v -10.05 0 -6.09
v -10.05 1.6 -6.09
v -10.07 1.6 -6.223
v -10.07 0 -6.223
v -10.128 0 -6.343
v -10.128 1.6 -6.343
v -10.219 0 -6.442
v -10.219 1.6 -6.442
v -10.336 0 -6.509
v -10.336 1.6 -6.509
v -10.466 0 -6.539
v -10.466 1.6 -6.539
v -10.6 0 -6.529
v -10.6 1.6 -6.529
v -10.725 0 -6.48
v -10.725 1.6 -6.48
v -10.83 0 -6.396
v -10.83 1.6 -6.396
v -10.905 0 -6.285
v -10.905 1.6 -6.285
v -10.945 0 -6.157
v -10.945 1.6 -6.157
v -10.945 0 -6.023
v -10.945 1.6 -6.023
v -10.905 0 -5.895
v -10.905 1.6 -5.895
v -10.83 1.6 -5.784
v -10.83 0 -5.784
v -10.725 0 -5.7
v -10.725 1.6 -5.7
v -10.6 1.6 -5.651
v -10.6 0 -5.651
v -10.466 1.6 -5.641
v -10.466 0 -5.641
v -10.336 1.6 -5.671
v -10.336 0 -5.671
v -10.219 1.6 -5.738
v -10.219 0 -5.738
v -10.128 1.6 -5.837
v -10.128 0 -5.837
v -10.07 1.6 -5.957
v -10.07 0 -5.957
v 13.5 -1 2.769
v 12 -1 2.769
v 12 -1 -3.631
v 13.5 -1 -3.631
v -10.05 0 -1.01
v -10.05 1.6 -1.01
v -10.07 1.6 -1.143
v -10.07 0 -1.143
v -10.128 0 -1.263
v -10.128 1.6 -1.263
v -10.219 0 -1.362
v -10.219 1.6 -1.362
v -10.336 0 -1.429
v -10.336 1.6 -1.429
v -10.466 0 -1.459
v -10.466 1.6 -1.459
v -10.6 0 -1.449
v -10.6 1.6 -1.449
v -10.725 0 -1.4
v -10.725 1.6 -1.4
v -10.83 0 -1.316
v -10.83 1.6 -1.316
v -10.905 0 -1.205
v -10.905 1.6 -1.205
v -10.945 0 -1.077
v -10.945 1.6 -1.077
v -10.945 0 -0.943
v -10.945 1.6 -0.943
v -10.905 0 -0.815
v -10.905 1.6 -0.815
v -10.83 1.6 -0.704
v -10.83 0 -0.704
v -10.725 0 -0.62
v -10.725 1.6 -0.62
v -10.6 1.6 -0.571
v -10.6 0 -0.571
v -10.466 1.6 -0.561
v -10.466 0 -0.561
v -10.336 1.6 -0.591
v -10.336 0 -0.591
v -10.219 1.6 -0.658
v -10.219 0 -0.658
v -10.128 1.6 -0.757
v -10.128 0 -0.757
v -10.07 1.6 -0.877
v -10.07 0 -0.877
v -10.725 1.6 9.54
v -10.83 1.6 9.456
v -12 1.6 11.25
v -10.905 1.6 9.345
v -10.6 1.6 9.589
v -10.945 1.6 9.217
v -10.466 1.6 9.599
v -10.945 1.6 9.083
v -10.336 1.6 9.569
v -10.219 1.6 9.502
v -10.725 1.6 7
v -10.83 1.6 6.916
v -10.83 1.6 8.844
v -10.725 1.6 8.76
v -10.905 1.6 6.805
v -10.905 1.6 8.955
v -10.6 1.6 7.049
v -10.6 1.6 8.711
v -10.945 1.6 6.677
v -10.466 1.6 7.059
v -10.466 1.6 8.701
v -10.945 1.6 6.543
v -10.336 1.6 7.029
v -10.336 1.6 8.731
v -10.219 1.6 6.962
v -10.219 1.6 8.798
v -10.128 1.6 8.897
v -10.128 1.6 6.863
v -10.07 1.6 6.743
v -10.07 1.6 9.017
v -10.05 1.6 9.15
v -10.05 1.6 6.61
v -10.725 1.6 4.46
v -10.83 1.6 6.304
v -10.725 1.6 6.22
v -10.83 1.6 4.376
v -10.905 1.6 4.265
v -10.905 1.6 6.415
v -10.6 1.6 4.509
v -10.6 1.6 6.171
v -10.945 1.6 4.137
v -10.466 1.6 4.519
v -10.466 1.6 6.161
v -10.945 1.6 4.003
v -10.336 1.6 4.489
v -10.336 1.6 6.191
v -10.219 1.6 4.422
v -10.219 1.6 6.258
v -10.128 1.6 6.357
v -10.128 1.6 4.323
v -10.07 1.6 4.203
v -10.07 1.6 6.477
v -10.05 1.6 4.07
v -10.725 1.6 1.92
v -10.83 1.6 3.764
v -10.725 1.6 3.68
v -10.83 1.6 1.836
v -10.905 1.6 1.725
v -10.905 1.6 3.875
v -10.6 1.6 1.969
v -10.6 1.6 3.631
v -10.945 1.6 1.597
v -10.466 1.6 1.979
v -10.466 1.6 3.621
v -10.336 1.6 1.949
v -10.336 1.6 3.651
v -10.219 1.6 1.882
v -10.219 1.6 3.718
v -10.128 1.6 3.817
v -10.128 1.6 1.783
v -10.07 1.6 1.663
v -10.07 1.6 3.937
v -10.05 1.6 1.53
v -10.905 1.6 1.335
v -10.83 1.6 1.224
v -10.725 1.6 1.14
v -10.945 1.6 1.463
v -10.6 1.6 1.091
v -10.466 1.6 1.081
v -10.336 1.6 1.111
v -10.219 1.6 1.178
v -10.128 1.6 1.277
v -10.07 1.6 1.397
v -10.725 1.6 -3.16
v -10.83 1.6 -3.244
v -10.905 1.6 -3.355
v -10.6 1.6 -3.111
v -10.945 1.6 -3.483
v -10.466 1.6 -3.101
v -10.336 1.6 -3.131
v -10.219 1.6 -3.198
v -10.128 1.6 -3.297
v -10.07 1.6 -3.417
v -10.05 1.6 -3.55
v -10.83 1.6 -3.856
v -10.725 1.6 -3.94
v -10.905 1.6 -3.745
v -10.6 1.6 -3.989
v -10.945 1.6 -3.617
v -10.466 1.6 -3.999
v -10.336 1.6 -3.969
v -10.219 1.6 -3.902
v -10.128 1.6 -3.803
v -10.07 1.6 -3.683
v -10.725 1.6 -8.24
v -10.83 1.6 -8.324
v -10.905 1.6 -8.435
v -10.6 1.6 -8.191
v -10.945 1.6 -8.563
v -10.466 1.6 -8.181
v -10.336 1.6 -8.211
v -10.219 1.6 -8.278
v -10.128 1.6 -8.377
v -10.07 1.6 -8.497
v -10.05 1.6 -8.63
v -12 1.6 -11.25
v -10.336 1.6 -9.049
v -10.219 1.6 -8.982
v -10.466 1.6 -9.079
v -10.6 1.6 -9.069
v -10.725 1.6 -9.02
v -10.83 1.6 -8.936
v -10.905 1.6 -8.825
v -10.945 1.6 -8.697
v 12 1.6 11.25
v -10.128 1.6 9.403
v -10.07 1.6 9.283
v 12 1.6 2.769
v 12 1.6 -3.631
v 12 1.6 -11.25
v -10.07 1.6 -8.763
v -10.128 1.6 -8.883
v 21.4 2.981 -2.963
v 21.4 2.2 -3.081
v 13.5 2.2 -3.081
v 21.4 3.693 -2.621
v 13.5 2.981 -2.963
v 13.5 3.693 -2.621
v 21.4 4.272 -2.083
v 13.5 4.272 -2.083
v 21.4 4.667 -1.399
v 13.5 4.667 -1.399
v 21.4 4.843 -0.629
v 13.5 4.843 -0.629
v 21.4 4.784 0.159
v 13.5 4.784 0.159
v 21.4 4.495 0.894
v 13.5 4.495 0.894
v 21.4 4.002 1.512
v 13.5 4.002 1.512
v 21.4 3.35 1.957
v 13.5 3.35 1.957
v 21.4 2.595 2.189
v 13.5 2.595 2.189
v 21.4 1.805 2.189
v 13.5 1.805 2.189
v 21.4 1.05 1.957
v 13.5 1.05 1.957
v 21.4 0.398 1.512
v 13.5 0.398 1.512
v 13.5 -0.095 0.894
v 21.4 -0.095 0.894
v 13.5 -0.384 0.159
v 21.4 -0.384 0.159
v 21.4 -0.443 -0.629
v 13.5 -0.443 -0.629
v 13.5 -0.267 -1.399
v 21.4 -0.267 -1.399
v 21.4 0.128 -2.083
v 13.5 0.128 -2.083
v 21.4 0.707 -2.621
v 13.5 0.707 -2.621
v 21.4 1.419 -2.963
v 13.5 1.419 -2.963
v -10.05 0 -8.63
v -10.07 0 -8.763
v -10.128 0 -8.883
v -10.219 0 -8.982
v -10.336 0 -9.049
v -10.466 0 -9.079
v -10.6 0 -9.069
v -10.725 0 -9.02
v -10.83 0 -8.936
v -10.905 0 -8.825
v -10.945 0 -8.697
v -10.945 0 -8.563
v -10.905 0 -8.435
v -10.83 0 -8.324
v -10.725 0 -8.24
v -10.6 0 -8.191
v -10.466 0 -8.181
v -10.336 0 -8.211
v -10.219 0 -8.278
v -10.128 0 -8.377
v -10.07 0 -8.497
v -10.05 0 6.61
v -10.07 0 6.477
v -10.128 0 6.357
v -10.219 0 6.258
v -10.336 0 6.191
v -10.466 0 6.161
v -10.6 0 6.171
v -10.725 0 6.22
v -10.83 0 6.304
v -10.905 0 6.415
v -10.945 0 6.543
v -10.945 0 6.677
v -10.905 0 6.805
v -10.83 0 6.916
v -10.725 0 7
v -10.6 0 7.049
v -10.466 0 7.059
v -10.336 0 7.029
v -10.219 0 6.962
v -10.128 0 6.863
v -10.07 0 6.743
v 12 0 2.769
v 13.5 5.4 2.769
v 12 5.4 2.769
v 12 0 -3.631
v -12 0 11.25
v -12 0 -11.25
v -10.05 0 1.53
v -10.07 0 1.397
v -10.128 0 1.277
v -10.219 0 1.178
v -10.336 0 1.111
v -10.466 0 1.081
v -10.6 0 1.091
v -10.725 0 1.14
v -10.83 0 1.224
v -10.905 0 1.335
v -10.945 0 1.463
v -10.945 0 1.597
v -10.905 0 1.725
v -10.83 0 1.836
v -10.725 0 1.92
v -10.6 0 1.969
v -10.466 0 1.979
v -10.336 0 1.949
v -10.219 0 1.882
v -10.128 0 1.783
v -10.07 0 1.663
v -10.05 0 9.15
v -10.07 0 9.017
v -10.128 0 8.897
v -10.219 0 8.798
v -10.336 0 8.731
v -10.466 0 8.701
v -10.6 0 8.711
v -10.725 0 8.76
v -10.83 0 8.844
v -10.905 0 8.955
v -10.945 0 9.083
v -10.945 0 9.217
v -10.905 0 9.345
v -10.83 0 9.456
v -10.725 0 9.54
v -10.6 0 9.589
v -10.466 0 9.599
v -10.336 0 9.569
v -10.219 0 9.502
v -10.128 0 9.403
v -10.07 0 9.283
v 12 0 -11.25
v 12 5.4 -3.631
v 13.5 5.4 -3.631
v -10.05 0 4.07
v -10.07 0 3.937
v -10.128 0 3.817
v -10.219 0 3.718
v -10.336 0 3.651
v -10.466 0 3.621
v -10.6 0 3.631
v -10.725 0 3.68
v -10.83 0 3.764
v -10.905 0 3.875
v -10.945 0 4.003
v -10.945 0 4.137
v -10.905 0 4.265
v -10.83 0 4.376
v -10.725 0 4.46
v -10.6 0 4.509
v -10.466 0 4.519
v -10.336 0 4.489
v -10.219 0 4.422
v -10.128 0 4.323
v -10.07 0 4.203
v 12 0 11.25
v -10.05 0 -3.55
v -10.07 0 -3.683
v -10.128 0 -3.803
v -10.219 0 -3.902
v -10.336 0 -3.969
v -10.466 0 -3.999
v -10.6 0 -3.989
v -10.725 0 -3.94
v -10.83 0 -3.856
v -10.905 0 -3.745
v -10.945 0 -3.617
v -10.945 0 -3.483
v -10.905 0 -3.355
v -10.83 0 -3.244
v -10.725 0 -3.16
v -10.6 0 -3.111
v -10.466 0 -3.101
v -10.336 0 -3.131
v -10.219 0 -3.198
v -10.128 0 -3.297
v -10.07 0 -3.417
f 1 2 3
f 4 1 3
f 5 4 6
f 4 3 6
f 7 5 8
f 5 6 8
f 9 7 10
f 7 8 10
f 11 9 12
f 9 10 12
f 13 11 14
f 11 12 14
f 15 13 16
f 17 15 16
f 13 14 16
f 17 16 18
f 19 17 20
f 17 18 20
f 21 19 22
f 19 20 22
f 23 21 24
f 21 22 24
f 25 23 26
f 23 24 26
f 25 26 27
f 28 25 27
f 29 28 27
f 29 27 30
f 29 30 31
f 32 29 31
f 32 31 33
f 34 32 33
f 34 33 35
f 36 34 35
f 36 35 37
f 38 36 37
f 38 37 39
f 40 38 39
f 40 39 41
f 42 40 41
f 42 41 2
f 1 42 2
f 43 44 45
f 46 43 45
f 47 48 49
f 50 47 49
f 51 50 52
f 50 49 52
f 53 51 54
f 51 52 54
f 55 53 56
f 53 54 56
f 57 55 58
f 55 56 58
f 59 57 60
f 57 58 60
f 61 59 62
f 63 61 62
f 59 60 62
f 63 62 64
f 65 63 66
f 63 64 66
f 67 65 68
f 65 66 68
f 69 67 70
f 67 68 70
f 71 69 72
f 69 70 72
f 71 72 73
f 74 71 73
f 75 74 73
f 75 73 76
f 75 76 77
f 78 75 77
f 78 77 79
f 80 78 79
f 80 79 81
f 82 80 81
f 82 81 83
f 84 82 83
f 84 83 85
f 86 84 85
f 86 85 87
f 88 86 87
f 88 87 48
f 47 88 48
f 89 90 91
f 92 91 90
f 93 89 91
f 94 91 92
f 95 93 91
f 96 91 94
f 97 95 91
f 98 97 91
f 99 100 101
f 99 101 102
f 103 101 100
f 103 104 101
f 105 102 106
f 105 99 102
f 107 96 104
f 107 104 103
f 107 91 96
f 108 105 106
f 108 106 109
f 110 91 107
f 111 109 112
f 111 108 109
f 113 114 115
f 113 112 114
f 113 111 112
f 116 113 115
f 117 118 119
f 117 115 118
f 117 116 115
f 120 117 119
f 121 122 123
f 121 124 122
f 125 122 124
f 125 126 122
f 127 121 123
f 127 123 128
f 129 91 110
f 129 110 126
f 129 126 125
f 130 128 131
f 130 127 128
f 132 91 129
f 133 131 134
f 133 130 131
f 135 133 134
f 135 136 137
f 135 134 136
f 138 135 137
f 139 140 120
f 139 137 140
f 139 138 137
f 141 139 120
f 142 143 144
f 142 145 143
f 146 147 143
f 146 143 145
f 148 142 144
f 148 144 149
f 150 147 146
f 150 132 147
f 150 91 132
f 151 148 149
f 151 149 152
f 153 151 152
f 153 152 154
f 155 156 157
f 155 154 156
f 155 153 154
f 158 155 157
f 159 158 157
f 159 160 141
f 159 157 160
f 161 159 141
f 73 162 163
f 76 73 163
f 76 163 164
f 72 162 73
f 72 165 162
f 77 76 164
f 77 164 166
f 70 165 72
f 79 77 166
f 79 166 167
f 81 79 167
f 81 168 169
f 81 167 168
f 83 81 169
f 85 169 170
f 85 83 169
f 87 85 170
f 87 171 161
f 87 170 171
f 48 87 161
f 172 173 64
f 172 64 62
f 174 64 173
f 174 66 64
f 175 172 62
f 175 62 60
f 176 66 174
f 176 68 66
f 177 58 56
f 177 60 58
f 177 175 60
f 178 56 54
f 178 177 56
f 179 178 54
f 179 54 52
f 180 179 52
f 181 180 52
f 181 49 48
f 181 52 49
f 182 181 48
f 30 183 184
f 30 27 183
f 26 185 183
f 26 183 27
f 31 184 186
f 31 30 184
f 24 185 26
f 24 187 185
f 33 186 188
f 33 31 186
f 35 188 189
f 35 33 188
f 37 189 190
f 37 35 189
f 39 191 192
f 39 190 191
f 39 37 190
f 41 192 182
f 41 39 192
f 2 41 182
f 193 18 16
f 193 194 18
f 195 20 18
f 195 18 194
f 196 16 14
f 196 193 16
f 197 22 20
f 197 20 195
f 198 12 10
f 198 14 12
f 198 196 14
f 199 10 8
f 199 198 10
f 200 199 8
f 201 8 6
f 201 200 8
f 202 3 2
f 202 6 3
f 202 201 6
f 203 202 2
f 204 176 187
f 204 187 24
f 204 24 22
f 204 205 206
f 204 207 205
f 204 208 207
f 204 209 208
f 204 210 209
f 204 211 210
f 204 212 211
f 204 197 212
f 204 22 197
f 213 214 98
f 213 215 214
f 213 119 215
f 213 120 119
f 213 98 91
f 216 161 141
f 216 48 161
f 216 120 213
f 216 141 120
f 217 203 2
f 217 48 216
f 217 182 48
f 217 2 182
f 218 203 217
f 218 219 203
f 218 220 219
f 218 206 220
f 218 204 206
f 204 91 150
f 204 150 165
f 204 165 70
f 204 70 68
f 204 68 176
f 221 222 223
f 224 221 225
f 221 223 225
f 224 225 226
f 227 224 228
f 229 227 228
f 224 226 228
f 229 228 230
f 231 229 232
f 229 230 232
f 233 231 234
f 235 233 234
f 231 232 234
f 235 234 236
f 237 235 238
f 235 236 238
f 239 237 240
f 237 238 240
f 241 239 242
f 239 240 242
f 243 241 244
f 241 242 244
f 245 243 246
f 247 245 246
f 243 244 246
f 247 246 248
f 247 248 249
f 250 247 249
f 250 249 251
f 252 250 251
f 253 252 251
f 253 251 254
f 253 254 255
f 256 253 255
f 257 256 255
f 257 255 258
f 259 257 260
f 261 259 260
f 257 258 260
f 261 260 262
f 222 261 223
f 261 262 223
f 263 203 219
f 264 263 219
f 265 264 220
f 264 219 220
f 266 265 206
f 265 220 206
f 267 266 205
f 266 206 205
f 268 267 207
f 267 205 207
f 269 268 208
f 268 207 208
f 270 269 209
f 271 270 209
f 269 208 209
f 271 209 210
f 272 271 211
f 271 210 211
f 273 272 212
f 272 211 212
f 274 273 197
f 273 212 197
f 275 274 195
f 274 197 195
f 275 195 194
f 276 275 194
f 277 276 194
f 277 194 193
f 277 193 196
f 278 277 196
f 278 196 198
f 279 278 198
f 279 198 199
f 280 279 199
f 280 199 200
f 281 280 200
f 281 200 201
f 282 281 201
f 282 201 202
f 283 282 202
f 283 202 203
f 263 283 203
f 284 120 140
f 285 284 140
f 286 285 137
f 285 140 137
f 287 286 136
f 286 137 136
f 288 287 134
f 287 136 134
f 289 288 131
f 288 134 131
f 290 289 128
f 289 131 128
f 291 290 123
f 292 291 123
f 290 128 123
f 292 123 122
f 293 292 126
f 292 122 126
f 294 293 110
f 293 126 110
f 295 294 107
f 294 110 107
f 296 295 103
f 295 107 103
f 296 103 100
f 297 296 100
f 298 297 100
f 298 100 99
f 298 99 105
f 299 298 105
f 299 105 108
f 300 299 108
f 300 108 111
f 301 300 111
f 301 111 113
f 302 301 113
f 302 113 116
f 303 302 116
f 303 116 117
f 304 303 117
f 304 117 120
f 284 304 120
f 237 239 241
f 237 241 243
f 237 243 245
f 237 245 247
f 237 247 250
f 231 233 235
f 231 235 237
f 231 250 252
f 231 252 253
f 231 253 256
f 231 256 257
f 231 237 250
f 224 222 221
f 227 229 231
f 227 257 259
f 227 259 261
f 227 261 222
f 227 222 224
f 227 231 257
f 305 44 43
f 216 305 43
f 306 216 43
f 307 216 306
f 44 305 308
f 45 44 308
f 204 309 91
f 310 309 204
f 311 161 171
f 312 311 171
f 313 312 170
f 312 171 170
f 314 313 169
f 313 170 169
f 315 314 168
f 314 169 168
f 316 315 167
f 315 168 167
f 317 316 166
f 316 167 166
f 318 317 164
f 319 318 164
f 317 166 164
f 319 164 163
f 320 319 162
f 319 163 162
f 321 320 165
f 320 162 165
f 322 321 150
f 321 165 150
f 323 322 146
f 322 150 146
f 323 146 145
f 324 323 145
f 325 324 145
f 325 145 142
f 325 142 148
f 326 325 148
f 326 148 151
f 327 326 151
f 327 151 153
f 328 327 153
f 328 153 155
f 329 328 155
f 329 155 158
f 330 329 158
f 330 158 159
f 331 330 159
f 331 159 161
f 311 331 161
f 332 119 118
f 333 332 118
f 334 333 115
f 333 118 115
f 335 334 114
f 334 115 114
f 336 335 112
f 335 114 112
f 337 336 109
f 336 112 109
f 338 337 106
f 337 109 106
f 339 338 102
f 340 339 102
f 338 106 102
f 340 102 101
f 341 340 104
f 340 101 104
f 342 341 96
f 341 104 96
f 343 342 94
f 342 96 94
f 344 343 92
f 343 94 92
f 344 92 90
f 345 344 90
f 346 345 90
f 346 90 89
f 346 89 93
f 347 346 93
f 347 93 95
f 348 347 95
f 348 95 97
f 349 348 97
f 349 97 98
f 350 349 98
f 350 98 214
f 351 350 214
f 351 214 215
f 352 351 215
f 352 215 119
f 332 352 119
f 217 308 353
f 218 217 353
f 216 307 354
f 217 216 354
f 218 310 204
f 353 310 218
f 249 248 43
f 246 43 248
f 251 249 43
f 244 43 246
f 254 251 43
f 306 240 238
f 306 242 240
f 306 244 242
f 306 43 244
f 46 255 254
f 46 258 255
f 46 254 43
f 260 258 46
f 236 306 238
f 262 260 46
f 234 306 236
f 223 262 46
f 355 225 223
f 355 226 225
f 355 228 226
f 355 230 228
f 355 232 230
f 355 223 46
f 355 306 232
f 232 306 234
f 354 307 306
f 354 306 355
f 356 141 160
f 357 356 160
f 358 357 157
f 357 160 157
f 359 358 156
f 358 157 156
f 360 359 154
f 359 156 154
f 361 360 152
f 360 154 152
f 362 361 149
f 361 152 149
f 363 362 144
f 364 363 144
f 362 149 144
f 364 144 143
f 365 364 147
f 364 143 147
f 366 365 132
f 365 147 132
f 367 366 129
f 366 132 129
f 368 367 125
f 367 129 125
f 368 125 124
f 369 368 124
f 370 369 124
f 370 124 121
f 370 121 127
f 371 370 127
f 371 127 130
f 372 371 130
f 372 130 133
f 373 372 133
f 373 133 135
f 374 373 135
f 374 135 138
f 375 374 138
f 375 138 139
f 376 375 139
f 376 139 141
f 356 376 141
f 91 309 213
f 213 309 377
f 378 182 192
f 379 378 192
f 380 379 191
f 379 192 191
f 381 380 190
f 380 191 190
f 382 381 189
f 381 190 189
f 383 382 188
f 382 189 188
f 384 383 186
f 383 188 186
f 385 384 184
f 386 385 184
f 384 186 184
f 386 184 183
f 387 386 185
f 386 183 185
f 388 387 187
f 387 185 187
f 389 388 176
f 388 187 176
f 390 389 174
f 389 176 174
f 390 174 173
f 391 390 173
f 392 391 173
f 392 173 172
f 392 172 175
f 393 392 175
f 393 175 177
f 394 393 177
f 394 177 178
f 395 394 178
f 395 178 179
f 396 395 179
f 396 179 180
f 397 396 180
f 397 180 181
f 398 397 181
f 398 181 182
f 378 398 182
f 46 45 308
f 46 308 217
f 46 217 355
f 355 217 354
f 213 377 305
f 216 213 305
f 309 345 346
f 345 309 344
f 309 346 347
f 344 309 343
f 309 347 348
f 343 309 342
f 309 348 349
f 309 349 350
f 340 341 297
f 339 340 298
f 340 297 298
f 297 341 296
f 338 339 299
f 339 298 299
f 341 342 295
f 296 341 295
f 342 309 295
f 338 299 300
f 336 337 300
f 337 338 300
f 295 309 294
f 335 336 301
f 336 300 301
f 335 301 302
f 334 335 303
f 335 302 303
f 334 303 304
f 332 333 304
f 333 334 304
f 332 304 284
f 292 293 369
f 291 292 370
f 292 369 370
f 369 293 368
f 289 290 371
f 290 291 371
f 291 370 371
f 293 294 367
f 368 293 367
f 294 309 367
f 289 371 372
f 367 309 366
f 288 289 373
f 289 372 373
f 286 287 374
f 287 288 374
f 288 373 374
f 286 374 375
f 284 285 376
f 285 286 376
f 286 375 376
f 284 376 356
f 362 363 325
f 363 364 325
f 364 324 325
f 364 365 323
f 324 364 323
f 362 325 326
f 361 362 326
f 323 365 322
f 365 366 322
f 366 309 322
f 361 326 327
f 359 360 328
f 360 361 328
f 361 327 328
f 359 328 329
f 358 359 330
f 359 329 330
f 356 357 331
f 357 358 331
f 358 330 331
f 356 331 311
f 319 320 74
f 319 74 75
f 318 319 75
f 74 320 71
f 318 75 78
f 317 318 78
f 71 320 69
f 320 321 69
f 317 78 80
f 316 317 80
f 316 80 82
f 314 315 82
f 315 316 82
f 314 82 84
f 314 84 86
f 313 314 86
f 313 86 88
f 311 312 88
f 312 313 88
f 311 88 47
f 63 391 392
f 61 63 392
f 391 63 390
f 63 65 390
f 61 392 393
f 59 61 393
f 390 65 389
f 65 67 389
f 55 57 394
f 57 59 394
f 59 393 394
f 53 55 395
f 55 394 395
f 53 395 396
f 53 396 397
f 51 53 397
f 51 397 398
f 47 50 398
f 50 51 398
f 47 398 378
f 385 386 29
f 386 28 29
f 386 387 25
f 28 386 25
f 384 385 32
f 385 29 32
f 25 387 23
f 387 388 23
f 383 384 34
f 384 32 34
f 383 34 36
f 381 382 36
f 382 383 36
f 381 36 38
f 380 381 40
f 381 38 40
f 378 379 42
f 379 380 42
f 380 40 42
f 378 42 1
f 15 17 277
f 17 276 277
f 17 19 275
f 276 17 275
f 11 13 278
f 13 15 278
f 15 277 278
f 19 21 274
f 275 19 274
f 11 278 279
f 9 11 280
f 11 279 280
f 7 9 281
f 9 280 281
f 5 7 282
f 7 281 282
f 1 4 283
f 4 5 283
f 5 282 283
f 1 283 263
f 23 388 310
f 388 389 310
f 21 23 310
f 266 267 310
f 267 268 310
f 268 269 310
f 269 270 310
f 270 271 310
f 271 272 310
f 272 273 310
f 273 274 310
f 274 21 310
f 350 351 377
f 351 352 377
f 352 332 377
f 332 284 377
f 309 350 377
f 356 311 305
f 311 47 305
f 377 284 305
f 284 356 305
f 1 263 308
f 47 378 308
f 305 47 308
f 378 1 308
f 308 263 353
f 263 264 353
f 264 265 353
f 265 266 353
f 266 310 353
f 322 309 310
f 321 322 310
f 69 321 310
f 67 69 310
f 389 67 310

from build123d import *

# Parameters (mm, degrees)
SKETCH1_W           = 24
SKETCH1_H           = 22.5
BOSS_EXTRUDE1_DEPTH = 1.6
SKETCH2_W           = 6.4
SKETCH2_H           = 6.4
BOSS_EXTRUDE2_DEPTH = 1.5
SKETCH3_R           = 2.65
BOSS_EXTRUDE3_DEPTH = 7.9
SKETCH4_R           = 0.45
CUT_EXTRUDE1_DEPTH  = 3.6
LPATTERN1_COUNT     = 8
LPATTERN1_PITCH     = 2.54


with BuildPart() as part:
    # Sketch1 → Boss-Extrude1 (new body)
    with BuildSketch(Plane(origin=(0, 0, 0), x_dir=(1, 0, 0), z_dir=(0, 1, 0))):
        Rectangle(SKETCH1_W, SKETCH1_H)
    extrude(amount=BOSS_EXTRUDE1_DEPTH)

    # Sketch2 → Boss-Extrude2 (add)
    with BuildSketch(Plane(origin=(12, 0, 0), x_dir=(0, 0, -1), z_dir=(1, 0, 0))):
        with Locations((0.431041527, 2.2)):
            Rectangle(SKETCH2_W, SKETCH2_H)
    extrude(amount=BOSS_EXTRUDE2_DEPTH)

    # Sketch3 → Boss-Extrude3 (add)
    with BuildSketch(Plane(origin=(13.5, 0, 0), x_dir=(0, 0, -1), z_dir=(1, 0, 0))):
        with Locations((0.431041527, 2.2)):
            Circle(SKETCH3_R)
    extrude(amount=BOSS_EXTRUDE3_DEPTH)

    # Sketch4 → Cut-Extrude1 (cut, through all)
    with BuildSketch(Plane(origin=(0, 1.6, 0), x_dir=(1, 0, 0), z_dir=(0, 1, 0))):
        with Locations((-10.5, -9.15)):
            Circle(SKETCH4_R)
    cut_extrude1 = extrude(amount=-CUT_EXTRUDE1_DEPTH, mode=Mode.SUBTRACT)

    # LPattern1: Cut-Extrude1 ×8
    with Locations(*[(0, 0, -i * LPATTERN1_PITCH) for i in range(1, LPATTERN1_COUNT)]):
        add(cut_extrude1, mode=Mode.SUBTRACT)


solid = part.part
